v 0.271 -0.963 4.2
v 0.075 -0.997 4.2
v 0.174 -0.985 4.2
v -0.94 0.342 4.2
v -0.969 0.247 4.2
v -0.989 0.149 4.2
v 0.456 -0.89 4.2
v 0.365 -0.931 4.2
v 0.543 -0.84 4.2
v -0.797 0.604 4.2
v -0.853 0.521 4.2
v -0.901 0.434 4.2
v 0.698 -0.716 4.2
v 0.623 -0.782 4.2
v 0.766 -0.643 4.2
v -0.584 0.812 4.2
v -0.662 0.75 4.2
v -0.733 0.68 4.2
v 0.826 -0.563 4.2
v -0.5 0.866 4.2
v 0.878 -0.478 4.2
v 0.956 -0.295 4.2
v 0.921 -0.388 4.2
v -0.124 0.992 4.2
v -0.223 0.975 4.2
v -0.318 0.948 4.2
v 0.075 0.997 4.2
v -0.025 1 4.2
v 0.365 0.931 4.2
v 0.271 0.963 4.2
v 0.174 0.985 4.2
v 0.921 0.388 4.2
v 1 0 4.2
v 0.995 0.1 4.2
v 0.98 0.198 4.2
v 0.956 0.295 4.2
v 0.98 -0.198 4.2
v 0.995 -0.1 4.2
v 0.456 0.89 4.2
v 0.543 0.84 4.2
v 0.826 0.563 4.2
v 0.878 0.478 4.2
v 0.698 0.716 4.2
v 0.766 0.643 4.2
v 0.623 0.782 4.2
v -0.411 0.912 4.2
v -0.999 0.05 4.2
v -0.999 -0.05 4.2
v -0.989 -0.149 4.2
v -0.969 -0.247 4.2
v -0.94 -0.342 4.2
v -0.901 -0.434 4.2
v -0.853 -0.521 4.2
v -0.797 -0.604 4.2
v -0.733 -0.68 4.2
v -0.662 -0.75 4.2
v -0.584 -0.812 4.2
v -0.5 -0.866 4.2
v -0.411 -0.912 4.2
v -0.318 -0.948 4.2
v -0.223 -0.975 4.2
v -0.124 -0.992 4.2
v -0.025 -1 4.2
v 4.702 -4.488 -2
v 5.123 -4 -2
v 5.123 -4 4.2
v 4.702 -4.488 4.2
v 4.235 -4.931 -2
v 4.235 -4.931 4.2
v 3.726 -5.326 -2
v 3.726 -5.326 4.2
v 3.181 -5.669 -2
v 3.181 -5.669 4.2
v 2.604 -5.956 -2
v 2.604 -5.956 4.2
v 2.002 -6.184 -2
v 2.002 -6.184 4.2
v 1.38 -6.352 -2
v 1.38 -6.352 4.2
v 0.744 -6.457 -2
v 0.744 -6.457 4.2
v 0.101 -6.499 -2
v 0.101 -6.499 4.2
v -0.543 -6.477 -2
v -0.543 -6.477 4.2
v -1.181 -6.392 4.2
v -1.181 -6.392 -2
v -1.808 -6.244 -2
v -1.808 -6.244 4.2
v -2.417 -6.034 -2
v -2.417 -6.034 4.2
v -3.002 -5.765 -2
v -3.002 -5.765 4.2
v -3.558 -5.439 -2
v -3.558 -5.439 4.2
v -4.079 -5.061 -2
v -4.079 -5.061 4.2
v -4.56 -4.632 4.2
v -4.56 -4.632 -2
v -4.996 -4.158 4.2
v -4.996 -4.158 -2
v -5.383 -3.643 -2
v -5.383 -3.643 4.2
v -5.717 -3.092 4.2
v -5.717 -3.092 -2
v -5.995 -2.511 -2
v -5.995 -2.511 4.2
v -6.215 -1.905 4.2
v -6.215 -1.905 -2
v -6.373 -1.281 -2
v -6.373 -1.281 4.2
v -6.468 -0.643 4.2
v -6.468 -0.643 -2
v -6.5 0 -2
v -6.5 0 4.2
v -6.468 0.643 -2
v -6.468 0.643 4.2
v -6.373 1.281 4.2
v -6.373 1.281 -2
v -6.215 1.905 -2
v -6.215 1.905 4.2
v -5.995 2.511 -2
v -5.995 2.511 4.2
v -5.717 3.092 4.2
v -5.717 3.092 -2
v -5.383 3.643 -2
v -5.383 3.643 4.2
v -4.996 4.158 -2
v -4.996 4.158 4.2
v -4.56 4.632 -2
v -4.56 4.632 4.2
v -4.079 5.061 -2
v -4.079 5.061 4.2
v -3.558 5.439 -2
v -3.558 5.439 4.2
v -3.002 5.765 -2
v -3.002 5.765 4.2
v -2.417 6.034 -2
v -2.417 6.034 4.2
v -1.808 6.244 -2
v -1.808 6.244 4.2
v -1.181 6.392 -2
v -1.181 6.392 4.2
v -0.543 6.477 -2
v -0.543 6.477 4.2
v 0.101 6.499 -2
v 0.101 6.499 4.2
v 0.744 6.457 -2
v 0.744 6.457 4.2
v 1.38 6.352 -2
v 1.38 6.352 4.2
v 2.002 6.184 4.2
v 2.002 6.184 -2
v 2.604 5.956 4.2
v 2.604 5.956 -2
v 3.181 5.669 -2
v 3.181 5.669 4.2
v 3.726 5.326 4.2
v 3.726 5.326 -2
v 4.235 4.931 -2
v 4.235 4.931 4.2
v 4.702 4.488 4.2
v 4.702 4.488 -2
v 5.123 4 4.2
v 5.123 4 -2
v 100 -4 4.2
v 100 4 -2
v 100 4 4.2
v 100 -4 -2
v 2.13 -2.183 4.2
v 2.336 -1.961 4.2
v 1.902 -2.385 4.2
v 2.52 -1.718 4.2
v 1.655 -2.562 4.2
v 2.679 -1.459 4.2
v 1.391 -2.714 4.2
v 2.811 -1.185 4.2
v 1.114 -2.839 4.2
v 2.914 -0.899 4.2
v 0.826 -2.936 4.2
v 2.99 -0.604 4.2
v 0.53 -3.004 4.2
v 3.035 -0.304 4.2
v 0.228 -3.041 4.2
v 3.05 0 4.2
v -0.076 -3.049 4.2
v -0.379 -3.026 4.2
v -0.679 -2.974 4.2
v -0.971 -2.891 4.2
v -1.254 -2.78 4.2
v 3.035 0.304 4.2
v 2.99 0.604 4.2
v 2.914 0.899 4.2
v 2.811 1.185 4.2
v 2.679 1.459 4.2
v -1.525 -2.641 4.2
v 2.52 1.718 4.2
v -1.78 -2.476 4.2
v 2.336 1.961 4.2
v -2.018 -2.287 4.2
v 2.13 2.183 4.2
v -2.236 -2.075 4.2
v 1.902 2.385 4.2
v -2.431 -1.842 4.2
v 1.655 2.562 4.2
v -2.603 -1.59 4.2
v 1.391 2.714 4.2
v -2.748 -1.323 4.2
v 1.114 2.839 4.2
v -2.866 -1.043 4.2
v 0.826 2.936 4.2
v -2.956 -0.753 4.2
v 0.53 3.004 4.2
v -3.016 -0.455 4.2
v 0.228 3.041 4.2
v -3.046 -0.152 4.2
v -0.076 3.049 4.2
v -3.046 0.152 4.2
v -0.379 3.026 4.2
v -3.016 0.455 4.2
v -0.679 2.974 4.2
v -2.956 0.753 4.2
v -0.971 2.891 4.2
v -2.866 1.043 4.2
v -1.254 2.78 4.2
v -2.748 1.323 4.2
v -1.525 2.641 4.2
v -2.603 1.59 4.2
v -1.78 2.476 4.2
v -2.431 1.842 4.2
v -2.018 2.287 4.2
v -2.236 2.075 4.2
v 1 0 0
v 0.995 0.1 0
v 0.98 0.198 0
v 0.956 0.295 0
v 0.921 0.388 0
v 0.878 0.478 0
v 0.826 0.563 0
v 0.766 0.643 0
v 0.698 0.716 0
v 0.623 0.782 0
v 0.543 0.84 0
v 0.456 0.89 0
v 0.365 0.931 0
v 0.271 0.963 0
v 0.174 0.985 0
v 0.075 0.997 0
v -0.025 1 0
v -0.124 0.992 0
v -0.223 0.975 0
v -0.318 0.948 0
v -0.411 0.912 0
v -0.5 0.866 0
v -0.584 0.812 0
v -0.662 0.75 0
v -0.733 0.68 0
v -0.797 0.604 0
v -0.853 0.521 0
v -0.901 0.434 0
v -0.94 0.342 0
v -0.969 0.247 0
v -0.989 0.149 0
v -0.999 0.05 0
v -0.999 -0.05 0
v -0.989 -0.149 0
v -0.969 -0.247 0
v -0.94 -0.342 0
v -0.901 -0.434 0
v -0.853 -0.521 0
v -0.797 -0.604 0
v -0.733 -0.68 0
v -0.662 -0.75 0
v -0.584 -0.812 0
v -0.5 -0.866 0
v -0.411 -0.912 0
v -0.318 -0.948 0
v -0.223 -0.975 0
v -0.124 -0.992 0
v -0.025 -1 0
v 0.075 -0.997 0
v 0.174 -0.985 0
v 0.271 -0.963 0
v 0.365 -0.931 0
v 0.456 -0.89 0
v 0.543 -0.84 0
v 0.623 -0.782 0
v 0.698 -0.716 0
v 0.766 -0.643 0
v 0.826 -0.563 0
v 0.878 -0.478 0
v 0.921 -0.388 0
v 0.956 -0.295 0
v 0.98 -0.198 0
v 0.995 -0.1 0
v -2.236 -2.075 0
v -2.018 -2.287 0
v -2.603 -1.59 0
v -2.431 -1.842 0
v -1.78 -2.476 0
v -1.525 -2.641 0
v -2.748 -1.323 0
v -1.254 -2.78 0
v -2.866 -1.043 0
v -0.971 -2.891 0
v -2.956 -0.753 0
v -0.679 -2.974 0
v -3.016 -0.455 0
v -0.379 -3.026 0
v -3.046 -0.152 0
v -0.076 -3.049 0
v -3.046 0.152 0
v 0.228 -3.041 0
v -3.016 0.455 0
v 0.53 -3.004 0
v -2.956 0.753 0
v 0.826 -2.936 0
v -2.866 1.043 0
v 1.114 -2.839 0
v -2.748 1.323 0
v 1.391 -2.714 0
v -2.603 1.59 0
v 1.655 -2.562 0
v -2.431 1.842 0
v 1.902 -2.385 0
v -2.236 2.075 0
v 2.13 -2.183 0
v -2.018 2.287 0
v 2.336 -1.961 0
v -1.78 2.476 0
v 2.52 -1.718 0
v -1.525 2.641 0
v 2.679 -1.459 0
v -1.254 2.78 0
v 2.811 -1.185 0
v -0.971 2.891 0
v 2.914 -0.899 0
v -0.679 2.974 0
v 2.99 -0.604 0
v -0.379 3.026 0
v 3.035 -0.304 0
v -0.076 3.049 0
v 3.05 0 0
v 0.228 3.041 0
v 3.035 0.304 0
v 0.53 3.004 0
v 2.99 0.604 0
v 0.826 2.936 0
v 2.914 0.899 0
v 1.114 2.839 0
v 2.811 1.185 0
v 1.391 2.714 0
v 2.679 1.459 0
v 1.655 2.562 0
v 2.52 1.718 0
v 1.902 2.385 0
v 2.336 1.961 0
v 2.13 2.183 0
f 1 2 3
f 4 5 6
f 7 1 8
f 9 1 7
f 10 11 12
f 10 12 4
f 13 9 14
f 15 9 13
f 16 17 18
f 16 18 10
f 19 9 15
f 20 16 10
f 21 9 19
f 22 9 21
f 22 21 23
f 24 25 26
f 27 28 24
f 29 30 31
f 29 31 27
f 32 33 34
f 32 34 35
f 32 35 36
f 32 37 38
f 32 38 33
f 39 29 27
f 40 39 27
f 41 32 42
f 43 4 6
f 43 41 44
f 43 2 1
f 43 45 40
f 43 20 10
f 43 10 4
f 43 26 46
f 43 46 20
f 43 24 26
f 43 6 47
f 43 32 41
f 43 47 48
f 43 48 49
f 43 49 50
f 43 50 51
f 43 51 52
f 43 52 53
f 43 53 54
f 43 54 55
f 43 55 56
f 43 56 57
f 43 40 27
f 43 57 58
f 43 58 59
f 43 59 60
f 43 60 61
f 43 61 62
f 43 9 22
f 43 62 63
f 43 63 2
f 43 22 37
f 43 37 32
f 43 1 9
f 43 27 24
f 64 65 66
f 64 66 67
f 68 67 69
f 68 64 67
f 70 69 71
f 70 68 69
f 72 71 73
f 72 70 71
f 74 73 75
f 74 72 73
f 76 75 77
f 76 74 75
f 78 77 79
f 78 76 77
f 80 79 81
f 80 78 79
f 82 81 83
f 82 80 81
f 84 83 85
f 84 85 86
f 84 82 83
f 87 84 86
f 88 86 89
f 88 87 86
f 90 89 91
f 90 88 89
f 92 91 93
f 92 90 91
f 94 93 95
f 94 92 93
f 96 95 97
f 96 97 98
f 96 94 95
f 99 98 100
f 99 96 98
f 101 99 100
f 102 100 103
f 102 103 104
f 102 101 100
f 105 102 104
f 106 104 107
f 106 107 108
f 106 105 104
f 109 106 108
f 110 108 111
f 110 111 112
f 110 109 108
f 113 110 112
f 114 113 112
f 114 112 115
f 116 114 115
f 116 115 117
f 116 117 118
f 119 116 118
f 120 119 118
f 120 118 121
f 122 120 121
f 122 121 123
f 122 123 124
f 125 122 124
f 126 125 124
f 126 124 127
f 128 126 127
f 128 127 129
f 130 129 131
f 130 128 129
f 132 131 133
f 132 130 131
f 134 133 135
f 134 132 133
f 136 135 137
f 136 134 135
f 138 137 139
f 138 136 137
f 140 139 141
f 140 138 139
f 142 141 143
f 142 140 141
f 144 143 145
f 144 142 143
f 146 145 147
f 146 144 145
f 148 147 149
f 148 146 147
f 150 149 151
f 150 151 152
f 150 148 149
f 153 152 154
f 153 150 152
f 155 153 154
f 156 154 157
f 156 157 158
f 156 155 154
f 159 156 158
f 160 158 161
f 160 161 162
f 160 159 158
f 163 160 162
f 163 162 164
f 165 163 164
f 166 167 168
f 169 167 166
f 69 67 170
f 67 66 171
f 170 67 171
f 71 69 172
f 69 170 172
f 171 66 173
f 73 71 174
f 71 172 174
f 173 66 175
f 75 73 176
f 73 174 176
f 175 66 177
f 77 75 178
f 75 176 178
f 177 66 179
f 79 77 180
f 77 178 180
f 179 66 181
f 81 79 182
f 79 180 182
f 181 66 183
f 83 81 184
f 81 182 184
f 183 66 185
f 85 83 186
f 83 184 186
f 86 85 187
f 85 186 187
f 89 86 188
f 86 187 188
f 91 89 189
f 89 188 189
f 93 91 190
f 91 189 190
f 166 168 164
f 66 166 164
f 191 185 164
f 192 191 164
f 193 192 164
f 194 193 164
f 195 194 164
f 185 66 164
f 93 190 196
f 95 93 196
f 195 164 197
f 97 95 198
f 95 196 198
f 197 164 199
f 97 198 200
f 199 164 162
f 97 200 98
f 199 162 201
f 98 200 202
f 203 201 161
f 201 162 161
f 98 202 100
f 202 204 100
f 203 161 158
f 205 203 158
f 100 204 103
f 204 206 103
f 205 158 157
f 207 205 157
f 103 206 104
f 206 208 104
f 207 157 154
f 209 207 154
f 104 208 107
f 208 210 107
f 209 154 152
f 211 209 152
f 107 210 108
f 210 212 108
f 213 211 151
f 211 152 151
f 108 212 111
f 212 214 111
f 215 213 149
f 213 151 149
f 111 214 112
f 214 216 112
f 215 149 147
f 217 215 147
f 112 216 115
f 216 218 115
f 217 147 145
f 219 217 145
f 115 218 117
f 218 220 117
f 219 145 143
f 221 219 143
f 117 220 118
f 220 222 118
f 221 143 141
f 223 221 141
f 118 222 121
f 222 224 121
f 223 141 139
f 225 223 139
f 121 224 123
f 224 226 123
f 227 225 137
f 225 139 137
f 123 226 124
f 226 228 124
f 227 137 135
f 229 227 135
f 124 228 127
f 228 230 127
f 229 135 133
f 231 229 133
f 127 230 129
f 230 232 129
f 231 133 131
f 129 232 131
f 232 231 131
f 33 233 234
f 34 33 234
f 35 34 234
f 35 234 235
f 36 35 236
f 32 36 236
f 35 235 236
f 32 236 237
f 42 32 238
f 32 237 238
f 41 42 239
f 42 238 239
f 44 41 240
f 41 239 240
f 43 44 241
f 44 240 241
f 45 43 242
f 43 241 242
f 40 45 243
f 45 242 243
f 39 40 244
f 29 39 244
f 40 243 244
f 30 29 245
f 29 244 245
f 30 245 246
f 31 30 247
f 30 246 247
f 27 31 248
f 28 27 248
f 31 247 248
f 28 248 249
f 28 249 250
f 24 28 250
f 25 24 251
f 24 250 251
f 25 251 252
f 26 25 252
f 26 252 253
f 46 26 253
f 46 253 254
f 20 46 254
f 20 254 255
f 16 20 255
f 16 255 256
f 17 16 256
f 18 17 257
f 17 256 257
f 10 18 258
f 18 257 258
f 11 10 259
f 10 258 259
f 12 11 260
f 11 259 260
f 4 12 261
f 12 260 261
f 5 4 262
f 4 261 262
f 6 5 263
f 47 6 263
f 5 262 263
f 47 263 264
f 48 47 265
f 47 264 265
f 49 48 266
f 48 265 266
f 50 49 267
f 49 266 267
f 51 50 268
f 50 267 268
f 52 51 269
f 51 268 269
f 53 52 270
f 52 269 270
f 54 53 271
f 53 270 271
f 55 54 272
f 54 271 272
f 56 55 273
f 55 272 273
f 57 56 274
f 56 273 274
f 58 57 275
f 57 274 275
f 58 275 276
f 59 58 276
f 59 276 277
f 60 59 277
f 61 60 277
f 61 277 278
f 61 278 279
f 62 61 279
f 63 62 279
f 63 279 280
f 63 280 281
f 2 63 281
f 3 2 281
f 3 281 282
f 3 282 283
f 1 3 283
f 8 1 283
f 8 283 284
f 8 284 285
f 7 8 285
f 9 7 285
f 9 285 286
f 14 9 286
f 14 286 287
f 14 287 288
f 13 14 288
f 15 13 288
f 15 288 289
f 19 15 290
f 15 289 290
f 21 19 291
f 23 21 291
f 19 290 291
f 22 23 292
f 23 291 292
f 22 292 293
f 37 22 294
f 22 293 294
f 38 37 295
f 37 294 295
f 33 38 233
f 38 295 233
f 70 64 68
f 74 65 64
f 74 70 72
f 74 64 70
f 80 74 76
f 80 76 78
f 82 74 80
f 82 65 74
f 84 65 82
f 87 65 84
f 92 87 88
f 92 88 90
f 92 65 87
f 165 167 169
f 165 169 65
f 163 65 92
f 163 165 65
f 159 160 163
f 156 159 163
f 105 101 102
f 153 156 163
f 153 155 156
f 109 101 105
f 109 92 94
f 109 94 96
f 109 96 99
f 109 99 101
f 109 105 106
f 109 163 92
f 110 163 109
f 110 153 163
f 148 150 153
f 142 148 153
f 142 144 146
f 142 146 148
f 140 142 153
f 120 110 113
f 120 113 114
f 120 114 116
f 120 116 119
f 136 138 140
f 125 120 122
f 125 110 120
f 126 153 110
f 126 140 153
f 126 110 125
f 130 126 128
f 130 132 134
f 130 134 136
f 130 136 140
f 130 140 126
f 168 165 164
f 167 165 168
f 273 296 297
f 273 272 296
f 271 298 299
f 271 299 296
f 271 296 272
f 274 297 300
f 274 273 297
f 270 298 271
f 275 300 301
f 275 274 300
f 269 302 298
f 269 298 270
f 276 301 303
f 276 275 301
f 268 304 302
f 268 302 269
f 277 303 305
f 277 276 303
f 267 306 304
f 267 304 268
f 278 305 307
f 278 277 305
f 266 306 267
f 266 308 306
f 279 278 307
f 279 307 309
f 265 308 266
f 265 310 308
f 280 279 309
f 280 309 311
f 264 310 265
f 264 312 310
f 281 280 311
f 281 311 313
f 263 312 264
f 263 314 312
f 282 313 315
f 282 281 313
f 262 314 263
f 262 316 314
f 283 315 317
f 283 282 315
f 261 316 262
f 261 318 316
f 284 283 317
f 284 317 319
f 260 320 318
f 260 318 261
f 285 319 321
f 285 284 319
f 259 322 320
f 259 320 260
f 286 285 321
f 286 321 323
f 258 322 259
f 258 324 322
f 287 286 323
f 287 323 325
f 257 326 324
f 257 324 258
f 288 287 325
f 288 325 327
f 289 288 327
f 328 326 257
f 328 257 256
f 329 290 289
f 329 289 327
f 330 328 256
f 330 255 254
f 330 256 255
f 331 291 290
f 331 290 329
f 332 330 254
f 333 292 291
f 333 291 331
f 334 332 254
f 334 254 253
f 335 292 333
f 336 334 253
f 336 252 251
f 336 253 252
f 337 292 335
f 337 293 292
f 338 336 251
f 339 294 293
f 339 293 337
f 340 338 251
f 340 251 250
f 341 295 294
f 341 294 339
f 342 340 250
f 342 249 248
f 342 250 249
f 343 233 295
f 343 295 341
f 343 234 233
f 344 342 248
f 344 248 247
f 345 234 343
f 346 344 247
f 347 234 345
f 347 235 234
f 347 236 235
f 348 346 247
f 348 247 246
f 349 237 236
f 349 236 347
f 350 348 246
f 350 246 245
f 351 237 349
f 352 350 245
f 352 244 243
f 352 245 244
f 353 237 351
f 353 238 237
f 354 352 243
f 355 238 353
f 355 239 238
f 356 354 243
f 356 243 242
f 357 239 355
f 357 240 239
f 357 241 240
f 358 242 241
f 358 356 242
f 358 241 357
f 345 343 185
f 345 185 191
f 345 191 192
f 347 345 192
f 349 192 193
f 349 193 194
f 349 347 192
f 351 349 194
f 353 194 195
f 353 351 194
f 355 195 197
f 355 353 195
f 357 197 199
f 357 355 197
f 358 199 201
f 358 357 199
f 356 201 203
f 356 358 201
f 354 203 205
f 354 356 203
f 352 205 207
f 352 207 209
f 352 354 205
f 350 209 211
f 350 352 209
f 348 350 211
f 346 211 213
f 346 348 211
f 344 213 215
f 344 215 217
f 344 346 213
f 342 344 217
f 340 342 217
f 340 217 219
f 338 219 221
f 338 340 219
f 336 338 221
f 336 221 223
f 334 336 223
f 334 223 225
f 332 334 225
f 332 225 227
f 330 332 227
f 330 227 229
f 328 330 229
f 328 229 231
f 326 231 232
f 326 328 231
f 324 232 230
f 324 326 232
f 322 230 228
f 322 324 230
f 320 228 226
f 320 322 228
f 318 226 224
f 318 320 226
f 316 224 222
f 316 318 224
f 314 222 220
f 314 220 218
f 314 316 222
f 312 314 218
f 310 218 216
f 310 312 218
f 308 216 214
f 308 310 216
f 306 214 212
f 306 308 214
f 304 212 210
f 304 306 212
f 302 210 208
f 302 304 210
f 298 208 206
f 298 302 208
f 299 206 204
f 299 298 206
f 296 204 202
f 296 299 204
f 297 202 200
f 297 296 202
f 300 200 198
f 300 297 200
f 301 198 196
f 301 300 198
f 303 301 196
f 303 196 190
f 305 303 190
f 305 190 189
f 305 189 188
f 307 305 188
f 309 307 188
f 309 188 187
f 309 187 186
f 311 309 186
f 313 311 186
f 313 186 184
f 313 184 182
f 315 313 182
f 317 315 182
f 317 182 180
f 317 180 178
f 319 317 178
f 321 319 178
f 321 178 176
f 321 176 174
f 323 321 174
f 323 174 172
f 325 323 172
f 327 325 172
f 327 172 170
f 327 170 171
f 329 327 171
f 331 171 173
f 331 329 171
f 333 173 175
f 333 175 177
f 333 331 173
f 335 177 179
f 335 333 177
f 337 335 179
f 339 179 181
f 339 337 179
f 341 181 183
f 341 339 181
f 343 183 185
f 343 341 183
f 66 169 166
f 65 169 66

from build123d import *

# Parameters (mm, degrees)
SKETCH_1_R        = 3.05
EXTRUDE_1_DEPTH   = 4.2
SKETCH_1_R_2      = 1
EXTRUDE_1_2_DEPTH = 4.2
EXTRUDE_START     = -2
EXTRUDE_2_DEPTH   = 2


with BuildPart() as part:
    # 草图1 → 凸台-拉伸1 (new body)
    with BuildSketch(Plane.XY):
        with BuildLine():
            Line((100, 4), (5.123475383, 4))
            ThreePointArc((5.123475383, 4), (-6.5, 0), (5.123475383, -4))
            Line((5.123475383, -4), (100, -4))
            Line((100, -4), (100, 4))
        make_face()
        Circle(SKETCH_1_R, mode=Mode.SUBTRACT)
    extrude(amount=EXTRUDE_1_DEPTH)



with BuildPart() as body_2:
    # 草图1 → Extrude 1 2 (new body)
    with BuildSketch(Plane.XY):
        Circle(SKETCH_1_R_2)
    extrude(amount=EXTRUDE_1_2_DEPTH)


with BuildPart() as part_1:
    add(part.part)

    add(body_2.part)  # 凸台-拉伸2 merges body 2
    # 草图1<4> → 凸台-拉伸2 (add)
    with BuildSketch(Plane.XY.offset(EXTRUDE_START)):
        with BuildLine():
            Line((100, 4), (5.123475383, 4))
            ThreePointArc((5.123475383, 4), (-6.5, 0), (5.123475383, -4))
            Line((5.123475383, -4), (100, -4))
            Line((100, -4), (100, 4))
        make_face()
    extrude(amount=EXTRUDE_2_DEPTH)


solid = part_1.part
